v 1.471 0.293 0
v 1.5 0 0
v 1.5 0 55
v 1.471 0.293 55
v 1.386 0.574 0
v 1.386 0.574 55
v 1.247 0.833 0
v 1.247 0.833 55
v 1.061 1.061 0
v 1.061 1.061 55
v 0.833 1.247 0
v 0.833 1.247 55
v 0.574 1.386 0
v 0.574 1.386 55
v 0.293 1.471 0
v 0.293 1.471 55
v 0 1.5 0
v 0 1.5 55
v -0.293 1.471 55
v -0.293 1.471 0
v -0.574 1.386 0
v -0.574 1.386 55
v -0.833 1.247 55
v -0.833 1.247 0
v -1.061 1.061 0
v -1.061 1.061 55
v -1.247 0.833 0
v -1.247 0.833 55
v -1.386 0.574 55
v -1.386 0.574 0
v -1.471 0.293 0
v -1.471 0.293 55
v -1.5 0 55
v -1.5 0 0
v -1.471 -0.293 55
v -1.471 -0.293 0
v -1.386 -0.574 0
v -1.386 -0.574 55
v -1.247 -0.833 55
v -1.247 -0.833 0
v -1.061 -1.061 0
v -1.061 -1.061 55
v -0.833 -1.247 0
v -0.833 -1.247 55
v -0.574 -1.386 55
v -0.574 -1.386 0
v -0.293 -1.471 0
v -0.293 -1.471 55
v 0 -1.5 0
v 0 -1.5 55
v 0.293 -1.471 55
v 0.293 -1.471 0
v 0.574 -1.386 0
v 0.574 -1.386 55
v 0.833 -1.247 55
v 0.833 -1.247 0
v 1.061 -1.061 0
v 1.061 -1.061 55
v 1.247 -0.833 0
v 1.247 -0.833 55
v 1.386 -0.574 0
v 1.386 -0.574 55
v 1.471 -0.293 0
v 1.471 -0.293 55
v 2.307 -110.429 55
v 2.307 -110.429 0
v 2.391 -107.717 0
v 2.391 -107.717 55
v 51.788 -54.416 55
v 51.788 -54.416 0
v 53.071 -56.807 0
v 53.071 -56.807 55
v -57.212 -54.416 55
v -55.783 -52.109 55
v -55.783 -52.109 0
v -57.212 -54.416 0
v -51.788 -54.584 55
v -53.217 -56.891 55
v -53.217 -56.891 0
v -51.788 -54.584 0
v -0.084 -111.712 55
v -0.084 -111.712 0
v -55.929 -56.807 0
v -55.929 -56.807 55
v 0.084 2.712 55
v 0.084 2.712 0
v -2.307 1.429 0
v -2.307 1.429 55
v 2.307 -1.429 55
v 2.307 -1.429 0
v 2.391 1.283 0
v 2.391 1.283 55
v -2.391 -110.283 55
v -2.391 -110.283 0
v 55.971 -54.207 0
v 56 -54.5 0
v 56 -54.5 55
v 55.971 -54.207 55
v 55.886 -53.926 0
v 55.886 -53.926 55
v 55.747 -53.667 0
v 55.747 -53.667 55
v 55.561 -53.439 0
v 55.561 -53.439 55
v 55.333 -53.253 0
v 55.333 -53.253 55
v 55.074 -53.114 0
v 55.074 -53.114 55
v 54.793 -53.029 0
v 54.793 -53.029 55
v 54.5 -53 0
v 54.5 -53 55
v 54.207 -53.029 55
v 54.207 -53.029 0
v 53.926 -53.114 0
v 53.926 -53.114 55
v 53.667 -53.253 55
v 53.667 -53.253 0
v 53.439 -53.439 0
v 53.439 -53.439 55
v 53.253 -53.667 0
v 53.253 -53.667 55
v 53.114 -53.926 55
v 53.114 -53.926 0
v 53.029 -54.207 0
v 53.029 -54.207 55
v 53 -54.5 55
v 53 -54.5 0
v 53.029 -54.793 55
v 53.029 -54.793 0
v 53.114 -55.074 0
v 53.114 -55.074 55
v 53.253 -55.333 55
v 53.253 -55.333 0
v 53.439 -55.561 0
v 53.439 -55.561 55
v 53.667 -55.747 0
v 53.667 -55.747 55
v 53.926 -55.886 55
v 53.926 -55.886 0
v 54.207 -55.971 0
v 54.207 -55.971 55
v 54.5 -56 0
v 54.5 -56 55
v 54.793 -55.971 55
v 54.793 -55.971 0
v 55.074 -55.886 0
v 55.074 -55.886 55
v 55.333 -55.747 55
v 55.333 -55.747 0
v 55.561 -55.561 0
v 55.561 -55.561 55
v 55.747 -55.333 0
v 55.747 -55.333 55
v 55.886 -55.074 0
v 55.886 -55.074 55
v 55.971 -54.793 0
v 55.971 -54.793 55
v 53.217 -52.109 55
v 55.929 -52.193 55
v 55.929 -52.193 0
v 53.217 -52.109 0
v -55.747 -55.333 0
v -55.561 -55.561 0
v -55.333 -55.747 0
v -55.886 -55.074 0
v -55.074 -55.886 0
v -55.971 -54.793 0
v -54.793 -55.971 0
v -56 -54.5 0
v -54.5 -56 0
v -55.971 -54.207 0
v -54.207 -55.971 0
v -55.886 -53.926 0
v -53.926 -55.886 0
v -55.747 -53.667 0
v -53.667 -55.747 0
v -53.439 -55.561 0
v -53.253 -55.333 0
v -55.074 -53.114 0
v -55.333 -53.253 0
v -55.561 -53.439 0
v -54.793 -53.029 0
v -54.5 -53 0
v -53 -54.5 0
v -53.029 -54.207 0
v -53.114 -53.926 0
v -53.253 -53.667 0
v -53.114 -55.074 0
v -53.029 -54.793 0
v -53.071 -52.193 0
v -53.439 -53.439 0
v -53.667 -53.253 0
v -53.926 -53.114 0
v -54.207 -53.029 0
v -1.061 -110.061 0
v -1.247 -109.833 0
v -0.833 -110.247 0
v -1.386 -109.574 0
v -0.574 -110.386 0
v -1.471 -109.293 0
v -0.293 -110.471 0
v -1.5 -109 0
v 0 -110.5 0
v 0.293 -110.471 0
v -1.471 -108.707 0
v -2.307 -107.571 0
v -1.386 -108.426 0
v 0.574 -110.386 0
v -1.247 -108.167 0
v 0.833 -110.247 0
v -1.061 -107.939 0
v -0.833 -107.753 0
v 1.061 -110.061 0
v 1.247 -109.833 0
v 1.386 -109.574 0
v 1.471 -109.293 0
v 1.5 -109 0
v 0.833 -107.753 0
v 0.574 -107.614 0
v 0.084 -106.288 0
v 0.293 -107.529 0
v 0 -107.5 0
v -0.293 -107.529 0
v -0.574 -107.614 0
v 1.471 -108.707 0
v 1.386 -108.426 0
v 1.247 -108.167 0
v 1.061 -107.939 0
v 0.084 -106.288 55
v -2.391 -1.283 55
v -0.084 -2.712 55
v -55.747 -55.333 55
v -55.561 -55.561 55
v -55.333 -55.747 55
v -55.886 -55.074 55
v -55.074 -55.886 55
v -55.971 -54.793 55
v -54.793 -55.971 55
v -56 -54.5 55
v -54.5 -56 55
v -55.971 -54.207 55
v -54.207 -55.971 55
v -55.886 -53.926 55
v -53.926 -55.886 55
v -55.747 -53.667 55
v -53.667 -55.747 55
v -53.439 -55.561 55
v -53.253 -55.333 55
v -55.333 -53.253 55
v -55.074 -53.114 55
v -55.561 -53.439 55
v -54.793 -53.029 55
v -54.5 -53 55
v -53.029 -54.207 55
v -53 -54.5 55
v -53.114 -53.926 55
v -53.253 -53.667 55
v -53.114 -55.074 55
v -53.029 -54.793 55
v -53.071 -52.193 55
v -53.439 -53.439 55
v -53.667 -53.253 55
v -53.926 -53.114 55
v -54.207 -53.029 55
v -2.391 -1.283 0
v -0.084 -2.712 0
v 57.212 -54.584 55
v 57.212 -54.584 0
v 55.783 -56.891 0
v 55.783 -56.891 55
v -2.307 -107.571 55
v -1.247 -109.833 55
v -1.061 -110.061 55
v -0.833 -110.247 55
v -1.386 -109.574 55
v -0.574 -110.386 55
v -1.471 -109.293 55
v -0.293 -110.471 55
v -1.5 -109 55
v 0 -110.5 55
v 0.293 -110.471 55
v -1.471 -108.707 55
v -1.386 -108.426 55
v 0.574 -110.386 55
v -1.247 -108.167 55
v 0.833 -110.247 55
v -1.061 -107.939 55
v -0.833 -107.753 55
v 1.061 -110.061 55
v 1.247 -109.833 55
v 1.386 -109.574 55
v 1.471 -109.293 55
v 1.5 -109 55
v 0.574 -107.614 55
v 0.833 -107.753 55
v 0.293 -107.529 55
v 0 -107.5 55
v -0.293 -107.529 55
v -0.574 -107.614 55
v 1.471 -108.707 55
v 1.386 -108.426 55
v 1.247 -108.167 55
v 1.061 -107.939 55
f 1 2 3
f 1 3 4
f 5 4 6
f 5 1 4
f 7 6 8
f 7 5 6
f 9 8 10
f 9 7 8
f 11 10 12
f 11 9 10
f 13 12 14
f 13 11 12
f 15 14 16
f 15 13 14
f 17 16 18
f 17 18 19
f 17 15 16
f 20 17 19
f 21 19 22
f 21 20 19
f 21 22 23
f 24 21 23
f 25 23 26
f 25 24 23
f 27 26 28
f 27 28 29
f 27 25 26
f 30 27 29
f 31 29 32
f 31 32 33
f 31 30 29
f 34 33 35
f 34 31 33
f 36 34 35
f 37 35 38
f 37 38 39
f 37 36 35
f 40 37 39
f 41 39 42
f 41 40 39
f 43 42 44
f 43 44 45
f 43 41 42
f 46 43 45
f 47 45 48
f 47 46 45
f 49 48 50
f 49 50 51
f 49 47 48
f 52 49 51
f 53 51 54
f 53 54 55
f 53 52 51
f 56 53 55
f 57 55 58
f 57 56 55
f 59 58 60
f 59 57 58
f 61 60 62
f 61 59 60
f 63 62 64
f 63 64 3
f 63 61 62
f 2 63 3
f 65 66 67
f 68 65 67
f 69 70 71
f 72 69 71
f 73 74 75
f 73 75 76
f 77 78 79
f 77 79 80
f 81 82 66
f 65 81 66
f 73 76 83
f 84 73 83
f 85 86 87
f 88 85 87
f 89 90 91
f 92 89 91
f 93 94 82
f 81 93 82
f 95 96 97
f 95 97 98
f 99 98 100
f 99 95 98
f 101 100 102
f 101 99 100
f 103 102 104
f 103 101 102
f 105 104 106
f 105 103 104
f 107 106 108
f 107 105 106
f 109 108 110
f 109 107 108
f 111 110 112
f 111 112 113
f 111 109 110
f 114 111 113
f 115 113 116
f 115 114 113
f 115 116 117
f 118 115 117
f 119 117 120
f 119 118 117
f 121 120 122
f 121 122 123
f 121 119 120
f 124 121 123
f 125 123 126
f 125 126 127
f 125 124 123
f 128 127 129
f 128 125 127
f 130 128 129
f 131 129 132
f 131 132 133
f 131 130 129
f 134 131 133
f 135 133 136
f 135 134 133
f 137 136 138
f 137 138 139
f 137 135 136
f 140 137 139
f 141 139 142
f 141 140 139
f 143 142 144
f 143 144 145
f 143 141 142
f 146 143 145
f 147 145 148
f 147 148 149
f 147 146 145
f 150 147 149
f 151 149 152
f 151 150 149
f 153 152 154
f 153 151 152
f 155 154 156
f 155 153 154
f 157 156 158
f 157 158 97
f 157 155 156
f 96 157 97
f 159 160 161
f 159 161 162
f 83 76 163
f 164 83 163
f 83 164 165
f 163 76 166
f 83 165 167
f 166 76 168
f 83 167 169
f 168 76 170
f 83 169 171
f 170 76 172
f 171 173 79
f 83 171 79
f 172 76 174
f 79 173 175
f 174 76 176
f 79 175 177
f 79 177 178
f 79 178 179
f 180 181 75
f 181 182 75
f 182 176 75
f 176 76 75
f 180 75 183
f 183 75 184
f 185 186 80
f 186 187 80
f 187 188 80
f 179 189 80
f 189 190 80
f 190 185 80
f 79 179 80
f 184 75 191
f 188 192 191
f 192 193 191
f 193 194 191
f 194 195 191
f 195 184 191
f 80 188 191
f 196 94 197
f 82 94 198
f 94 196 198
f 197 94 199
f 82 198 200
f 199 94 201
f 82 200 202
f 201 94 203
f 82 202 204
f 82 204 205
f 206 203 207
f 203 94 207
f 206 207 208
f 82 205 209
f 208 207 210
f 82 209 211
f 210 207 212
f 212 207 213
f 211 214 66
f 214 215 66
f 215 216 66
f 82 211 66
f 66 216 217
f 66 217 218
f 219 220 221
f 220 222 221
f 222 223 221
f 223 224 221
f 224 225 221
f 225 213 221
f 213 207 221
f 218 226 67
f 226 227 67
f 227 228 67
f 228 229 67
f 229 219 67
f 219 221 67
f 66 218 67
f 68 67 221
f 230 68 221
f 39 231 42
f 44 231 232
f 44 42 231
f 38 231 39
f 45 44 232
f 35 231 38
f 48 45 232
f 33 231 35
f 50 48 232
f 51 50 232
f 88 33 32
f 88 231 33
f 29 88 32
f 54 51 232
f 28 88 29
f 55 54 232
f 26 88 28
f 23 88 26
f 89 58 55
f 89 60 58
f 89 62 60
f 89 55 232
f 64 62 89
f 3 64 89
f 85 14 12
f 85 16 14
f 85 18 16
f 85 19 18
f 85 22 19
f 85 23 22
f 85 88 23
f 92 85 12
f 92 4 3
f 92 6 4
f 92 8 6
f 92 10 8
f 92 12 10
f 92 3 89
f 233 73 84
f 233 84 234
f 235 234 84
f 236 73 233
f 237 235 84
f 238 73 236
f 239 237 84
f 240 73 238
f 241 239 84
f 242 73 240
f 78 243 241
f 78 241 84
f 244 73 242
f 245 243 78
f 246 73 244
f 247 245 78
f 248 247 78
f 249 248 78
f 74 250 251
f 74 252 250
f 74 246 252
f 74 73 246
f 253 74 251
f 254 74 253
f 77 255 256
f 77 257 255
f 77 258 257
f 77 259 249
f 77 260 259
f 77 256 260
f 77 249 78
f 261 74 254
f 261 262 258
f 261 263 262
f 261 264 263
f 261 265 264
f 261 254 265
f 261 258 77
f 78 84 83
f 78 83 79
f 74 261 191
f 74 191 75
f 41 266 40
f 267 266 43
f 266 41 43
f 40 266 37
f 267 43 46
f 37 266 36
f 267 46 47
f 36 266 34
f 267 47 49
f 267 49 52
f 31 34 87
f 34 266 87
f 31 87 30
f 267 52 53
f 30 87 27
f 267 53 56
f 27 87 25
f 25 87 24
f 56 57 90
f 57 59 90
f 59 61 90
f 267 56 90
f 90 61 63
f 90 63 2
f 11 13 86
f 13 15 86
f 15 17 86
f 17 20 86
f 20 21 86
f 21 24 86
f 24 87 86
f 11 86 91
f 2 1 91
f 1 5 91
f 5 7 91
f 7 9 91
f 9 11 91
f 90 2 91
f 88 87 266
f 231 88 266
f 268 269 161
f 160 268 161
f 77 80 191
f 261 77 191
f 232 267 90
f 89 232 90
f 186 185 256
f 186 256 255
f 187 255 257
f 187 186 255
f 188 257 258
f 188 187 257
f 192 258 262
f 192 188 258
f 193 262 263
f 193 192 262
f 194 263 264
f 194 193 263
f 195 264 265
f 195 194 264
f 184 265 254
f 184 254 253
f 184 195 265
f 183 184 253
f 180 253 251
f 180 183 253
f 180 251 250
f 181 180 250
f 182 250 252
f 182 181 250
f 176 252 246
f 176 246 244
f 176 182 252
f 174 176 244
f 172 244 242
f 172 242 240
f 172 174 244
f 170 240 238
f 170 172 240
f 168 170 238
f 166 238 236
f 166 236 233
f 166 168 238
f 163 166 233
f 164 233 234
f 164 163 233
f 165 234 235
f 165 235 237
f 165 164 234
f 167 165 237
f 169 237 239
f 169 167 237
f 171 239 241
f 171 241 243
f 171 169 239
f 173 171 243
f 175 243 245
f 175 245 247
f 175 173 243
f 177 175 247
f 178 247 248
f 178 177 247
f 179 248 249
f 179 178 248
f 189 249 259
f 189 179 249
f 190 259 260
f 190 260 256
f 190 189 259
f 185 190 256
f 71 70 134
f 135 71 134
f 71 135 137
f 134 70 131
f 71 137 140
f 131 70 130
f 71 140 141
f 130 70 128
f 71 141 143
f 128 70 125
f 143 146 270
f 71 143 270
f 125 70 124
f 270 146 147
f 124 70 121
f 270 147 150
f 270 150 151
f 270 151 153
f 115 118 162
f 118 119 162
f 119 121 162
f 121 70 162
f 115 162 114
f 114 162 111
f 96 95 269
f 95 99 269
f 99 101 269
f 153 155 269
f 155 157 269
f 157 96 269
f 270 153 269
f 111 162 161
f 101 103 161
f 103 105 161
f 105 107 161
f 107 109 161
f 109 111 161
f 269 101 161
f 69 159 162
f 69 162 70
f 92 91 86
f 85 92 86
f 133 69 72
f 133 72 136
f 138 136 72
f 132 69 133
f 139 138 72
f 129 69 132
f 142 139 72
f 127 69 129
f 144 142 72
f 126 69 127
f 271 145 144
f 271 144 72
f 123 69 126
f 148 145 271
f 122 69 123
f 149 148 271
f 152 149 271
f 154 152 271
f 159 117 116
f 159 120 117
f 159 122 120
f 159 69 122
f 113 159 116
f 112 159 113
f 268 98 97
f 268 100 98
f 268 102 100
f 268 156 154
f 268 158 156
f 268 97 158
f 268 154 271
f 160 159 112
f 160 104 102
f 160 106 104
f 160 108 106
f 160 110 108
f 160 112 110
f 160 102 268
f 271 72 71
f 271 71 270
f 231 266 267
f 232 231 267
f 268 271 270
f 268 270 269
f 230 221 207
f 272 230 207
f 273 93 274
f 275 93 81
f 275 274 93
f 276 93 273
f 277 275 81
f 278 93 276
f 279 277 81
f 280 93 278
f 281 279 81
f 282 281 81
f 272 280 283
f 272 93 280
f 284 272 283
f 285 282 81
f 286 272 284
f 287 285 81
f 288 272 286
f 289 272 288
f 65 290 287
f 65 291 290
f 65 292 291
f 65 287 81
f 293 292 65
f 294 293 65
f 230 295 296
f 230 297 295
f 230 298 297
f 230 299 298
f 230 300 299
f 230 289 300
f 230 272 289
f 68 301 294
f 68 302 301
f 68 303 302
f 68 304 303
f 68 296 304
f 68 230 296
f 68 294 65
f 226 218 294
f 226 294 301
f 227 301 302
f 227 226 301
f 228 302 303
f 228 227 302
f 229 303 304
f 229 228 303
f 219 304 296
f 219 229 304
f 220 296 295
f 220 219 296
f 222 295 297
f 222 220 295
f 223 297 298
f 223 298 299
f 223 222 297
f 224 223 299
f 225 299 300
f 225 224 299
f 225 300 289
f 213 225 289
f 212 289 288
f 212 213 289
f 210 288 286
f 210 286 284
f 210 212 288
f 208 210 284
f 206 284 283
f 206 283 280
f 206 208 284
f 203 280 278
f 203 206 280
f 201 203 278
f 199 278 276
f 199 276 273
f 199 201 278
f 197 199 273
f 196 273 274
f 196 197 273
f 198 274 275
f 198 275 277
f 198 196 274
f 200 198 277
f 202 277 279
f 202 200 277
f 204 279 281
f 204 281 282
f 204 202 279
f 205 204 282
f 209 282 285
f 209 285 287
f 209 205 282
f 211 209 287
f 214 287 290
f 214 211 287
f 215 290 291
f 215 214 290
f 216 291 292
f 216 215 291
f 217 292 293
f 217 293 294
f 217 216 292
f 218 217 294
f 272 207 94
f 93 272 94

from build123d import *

# Parameters (mm, degrees)
SKETCH_1_R        = 1.5
EXTRUDE_1_DEPTH   = 55
EXTRUDE_1_2_DEPTH = 55
EXTRUDE_1_3_DEPTH = 55
EXTRUDE_1_4_DEPTH = 55


with BuildPart() as part:
    # 草图1 → 凸台-拉伸1 (new body)
    with BuildSketch(Plane.XY):
        Polygon((53.071106767, -56.806858787), (55.783351696, -56.890887232), (57.212244929, -54.584028446), (55.928893233, -52.193141213), (53.216648304, -52.109112768), (51.787755071, -54.415971554), align=None)
        with Locations((54.5, -54.5)):
            Circle(SKETCH_1_R, mode=Mode.SUBTRACT)
    extrude(amount=EXTRUDE_1_DEPTH)


with BuildPart() as body_2:
    # 草图1 → Extrude 1 2 (new body)
    with BuildSketch(Plane.XY):
        Polygon((2.306858787, -1.428893233), (2.390887232, 1.283351696), (0.084028446, 2.712244929), (-2.306858787, 1.428893233), (-2.390887232, -1.283351696), (-0.084028446, -2.712244929), align=None)
        Circle(SKETCH_1_R, mode=Mode.SUBTRACT)
    extrude(amount=EXTRUDE_1_2_DEPTH)


with BuildPart() as body_3:
    # 草图1 → Extrude 1 3 (new body)
    with BuildSketch(Plane.XY):
        Polygon((-2.306858787, -107.571106767), (-2.390887232, -110.283351696), (-0.084028446, -111.712244929), (2.306858787, -110.428893233), (2.390887232, -107.716648304), (0.084028446, -106.287755071), align=None)
        with Locations((0, -109)):
            Circle(SKETCH_1_R, mode=Mode.SUBTRACT)
    extrude(amount=EXTRUDE_1_3_DEPTH)


with BuildPart() as body_4:
    # 草图1 → Extrude 1 4 (new body)
    with BuildSketch(Plane.XY):
        Polygon((-53.071106767, -52.193141213), (-55.783351696, -52.109112768), (-57.212244929, -54.415971554), (-55.928893233, -56.806858787), (-53.216648304, -56.890887232), (-51.787755071, -54.584028446), align=None)
        with Locations((-54.5, -54.5)):
            Circle(SKETCH_1_R, mode=Mode.SUBTRACT)
    extrude(amount=EXTRUDE_1_4_DEPTH)


solid = Compound([part.part, body_2.part, body_3.part, body_4.part])
